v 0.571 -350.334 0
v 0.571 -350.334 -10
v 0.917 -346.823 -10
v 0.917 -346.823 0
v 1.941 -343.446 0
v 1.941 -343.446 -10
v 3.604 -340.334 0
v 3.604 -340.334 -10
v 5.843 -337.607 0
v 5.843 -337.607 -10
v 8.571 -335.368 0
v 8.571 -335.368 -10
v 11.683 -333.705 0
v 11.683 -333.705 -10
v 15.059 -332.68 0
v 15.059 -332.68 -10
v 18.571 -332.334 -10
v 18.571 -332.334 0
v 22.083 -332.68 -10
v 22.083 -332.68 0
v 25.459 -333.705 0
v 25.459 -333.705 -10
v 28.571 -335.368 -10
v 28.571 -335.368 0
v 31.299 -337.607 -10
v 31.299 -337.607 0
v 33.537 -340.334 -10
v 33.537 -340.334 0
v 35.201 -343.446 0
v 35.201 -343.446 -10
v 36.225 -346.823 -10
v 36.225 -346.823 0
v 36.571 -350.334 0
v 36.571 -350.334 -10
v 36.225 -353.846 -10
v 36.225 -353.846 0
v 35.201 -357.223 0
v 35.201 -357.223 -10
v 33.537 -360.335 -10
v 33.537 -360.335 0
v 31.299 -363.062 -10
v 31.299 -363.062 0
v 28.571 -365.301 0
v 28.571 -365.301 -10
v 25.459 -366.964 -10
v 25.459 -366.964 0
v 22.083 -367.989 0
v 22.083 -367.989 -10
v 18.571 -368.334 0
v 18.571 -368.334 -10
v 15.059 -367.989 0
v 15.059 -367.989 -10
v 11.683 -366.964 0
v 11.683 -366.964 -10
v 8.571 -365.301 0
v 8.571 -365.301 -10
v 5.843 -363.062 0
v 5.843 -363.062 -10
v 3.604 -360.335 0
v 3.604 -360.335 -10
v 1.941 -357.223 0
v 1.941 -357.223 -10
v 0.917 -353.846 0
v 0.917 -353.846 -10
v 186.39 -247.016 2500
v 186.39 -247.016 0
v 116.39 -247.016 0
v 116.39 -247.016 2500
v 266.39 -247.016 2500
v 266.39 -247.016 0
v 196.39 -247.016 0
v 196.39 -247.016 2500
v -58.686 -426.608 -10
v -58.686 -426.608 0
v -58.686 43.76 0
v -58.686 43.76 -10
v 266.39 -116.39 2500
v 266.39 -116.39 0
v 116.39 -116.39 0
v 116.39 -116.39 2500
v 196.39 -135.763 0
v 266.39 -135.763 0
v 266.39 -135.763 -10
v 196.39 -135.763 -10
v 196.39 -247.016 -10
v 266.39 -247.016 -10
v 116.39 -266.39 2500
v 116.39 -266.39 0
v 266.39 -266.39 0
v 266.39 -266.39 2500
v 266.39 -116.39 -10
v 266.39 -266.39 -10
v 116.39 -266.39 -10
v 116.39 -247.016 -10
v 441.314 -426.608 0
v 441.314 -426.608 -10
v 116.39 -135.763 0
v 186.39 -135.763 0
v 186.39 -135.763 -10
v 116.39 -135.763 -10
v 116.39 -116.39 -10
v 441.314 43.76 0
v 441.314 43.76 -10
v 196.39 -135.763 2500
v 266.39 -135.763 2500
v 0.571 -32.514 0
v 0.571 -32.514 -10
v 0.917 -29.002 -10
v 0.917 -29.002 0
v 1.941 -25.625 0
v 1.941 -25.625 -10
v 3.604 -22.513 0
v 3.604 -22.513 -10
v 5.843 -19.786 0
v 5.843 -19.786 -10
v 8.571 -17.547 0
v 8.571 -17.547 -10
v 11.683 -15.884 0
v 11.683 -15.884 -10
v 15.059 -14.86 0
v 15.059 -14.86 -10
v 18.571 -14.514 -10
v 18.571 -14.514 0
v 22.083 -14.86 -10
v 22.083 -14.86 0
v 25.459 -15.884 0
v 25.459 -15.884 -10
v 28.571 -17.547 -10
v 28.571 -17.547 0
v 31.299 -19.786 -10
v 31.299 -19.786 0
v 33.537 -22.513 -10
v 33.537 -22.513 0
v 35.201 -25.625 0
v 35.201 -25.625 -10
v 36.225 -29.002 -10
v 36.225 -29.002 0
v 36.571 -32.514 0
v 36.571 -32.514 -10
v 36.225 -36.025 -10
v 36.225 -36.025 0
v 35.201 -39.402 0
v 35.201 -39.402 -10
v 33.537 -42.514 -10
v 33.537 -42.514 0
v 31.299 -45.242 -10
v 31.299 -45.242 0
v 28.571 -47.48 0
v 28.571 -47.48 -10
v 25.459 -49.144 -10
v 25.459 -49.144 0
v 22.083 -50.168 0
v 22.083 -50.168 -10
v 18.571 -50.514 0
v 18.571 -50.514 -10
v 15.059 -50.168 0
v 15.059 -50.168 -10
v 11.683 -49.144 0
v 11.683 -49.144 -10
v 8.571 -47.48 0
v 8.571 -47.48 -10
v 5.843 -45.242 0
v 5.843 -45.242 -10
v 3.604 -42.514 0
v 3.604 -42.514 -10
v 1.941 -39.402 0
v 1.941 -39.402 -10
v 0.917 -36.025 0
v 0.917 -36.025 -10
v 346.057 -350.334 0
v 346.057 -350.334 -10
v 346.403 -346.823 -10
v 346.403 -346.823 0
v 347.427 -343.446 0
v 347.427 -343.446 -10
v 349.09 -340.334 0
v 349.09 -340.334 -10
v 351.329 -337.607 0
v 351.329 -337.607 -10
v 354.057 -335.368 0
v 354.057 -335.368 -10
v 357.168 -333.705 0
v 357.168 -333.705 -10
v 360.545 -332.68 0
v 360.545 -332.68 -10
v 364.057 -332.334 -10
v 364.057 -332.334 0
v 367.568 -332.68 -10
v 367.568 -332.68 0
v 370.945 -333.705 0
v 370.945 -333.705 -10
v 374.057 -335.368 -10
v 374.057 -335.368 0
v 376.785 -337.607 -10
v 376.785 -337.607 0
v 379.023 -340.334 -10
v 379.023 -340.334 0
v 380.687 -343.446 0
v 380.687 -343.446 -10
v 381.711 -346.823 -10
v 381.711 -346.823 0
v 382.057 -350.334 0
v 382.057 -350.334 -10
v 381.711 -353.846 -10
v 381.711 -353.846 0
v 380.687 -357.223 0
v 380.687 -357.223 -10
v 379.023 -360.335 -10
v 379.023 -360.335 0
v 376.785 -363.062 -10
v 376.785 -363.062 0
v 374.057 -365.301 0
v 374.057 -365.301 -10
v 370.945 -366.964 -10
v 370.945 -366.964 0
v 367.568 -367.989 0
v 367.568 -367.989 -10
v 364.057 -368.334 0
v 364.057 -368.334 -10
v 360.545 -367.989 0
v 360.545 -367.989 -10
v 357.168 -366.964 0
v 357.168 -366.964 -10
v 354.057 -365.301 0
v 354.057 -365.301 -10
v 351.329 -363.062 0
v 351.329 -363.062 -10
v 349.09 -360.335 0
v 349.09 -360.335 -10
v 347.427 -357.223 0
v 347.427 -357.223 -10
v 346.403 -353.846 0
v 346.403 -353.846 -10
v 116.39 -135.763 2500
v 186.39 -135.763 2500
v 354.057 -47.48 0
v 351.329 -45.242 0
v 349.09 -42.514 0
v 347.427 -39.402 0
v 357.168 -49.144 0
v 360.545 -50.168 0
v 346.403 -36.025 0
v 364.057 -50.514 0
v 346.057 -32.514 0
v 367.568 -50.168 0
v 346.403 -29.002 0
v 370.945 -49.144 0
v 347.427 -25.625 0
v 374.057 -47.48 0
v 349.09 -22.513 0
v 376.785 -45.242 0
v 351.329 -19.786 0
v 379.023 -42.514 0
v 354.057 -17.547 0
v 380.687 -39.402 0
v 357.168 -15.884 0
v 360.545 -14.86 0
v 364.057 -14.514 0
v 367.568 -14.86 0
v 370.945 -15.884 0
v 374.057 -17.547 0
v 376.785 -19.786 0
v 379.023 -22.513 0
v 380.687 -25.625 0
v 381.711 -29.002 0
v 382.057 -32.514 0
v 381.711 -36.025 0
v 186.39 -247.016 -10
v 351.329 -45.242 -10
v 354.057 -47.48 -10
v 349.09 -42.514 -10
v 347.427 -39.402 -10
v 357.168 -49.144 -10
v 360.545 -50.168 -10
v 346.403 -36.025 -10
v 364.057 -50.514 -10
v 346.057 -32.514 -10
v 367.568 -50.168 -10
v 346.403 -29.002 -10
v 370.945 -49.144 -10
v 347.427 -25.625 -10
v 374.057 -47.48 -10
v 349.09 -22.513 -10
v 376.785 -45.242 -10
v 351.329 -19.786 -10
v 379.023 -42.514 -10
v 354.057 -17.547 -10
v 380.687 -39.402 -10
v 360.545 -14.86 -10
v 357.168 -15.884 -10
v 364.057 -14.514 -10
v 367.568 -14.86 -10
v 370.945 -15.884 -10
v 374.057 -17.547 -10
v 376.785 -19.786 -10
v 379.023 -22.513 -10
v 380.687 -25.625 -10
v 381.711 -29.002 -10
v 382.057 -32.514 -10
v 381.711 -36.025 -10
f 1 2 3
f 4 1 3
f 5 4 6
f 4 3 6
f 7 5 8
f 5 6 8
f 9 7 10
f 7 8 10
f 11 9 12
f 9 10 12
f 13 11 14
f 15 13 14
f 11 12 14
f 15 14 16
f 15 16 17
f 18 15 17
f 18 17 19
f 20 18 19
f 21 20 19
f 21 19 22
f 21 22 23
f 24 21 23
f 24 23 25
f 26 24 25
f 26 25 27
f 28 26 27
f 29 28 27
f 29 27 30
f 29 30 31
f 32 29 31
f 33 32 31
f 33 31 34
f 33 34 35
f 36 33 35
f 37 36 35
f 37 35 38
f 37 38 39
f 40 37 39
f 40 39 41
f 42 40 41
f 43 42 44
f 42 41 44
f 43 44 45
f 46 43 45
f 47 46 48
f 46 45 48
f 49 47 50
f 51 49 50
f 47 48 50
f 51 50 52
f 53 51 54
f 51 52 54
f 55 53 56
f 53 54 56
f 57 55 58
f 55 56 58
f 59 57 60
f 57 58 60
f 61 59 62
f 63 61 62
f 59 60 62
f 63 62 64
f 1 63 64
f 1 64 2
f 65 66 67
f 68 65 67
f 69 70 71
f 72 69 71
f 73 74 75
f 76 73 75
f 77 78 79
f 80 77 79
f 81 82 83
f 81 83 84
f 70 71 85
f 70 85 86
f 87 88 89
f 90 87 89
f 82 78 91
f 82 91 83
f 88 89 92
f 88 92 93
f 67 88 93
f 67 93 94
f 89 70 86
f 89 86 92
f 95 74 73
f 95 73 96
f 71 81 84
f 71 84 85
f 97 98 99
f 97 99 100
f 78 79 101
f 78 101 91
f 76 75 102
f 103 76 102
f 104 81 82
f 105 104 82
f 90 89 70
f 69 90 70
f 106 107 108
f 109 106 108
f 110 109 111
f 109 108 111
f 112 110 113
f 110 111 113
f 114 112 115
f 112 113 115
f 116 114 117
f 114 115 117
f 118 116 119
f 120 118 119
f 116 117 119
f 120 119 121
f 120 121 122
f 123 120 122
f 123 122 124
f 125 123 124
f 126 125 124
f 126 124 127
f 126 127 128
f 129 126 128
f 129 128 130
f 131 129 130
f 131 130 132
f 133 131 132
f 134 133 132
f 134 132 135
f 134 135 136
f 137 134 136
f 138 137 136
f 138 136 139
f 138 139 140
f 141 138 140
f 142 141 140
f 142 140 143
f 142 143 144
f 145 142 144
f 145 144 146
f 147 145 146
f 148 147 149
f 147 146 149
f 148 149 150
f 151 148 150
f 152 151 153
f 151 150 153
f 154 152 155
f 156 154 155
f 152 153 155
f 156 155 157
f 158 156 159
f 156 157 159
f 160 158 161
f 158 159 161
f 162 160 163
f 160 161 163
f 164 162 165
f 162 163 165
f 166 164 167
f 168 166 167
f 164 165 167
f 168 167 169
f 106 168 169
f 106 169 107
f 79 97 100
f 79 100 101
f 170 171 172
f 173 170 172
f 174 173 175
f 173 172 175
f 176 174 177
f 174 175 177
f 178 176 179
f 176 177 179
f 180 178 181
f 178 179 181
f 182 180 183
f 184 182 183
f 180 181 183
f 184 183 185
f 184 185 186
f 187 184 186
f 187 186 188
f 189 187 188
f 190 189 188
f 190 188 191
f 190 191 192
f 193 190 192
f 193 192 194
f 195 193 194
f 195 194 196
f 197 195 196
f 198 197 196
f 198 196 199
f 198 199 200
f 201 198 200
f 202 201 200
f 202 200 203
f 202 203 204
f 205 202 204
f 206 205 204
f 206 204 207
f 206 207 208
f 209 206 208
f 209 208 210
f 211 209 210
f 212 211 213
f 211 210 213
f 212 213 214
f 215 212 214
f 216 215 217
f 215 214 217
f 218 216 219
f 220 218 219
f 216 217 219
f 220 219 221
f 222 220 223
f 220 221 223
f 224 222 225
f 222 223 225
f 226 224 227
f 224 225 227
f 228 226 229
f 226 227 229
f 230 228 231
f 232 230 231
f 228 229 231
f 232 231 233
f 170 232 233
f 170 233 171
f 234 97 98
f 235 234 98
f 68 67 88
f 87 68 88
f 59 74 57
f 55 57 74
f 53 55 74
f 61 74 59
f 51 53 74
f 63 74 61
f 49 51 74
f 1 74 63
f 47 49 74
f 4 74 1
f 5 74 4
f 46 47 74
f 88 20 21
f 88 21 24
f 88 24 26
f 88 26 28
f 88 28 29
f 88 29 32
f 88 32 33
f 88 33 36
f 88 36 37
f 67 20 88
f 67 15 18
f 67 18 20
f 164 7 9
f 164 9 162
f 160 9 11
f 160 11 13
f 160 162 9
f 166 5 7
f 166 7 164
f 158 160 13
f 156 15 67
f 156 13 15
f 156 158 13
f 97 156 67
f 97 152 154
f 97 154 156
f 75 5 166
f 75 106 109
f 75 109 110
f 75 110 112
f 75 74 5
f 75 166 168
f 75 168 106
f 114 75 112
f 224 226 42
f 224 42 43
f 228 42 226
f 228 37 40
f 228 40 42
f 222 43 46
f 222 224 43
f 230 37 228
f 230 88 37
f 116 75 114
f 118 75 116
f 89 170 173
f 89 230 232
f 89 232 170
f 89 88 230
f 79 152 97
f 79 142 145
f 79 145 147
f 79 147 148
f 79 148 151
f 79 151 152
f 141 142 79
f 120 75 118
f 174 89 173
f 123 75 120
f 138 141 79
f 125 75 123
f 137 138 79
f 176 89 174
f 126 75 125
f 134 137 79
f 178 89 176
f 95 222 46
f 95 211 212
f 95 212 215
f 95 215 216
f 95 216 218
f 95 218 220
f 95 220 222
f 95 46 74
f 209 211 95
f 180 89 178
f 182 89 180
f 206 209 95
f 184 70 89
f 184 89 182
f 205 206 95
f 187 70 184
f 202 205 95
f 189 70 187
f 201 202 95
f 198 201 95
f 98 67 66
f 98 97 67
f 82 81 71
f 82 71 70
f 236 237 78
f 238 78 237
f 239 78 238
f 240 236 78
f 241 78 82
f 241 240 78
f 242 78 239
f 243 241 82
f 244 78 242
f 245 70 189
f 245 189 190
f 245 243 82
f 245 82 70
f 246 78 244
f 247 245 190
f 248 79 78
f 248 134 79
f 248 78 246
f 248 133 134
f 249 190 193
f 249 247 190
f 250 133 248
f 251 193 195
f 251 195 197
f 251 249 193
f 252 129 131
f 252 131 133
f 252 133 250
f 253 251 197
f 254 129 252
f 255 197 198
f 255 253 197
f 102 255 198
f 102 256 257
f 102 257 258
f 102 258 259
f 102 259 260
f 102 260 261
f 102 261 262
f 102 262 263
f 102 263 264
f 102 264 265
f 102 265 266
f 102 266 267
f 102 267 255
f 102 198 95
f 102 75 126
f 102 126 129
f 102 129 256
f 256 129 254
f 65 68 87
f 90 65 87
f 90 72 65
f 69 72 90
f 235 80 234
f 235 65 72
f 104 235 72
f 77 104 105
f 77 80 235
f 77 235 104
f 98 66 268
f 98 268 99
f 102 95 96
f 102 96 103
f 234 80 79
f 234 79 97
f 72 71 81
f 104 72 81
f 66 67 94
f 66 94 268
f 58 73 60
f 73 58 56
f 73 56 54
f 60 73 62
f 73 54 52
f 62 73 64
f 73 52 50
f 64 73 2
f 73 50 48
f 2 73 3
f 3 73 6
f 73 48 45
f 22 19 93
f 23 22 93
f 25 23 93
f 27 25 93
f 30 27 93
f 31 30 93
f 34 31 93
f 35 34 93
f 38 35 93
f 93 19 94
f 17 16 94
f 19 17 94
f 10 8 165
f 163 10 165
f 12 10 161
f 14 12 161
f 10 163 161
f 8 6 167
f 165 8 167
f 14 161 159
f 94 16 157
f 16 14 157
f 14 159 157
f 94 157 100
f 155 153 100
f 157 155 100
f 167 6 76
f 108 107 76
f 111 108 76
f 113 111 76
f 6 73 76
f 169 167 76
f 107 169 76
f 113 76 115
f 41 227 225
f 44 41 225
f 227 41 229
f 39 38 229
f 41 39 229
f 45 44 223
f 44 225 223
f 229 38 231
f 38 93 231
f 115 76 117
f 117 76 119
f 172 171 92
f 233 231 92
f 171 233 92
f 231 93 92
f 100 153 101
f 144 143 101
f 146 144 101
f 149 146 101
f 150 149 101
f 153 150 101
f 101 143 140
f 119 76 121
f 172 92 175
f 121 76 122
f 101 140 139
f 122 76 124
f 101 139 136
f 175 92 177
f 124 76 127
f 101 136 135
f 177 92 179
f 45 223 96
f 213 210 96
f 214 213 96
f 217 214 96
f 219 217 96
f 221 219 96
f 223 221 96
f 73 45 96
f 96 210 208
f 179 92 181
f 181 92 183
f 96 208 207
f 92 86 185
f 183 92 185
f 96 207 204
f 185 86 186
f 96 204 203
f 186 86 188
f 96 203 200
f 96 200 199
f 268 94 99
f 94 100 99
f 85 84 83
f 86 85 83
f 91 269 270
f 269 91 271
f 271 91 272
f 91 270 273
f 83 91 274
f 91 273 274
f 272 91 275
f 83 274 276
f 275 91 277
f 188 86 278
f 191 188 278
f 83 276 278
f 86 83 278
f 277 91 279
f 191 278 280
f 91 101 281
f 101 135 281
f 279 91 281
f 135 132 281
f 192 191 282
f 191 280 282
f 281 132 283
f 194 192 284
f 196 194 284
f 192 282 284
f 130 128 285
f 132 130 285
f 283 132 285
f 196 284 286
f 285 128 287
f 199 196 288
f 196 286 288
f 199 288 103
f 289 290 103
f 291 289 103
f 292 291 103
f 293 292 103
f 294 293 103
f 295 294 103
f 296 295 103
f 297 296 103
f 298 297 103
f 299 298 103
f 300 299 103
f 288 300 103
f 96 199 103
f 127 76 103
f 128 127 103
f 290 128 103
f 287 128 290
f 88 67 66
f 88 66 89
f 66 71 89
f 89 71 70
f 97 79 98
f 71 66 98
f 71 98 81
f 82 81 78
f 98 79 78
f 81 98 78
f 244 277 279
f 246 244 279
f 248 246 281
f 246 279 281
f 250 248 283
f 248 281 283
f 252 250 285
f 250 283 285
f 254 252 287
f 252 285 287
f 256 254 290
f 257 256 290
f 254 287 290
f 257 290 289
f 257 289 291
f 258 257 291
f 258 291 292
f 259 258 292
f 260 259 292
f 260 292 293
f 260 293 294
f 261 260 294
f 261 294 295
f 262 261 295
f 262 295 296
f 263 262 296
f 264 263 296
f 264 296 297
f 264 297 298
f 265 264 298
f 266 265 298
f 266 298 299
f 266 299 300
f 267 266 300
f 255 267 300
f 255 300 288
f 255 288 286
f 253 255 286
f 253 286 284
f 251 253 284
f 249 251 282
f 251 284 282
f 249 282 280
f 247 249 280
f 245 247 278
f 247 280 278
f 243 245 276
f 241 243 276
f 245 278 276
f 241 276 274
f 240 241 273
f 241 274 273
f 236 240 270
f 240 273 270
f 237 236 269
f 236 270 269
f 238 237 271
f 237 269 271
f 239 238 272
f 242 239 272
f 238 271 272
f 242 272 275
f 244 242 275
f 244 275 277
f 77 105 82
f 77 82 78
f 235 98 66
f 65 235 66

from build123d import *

# Parameters (mm, degrees)
F1_DEPTH = 2500
F2_W     = 500
F2_H     = 470.368494
F3_DEPTH = 10
F5_D     = 36


with BuildPart() as f1:
    # F0 (on Top) → F1 (new body)
    with BuildSketch(Plane.XY):
        Polygon((116.389801, -247.016438), (116.389801, -266.389801), (191.389801, -266.389801), (266.389801, -266.389801), (266.389801, -247.016438), (196.389801, -247.016438), (196.389801, -135.763163), (266.389801, -135.763163), (266.389801, -116.389801), (191.389801, -116.389801), (116.389801, -116.389801), (116.389801, -135.763163), (186.389801, -135.763163), (186.389801, -247.016438), align=None)
    extrude(amount=F1_DEPTH)


with BuildPart() as f3:
    # F2 (on face) → F3 (new body)
    with BuildSketch(Plane.XY):
        with Locations((191.313848, -191.424057)):
            Rectangle(F2_W, F2_H)
        Polygon((116.389801, -266.389801), (116.389801, -247.016438), (186.389801, -247.016438), (186.389801, -135.763163), (116.389801, -135.763163), (116.389801, -116.389801), (191.389801, -116.389801), (266.389801, -116.389801), (266.389801, -135.763163), (196.389801, -135.763163), (196.389801, -247.016438), (266.389801, -247.016438), (266.389801, -266.389801), (191.389801, -266.389801), align=None, mode=Mode.SUBTRACT)
    extrude(amount=-F3_DEPTH)

    # F5 (through all)
    with Locations(Plane.XY):
        with Locations((18.570913, -32.513674), (18.570913, -350.334439), (364.056783, -350.334439), (364.056783, -32.513674)):
            Hole(F5_D / 2)


solid = Compound([f1.part, f3.part])
